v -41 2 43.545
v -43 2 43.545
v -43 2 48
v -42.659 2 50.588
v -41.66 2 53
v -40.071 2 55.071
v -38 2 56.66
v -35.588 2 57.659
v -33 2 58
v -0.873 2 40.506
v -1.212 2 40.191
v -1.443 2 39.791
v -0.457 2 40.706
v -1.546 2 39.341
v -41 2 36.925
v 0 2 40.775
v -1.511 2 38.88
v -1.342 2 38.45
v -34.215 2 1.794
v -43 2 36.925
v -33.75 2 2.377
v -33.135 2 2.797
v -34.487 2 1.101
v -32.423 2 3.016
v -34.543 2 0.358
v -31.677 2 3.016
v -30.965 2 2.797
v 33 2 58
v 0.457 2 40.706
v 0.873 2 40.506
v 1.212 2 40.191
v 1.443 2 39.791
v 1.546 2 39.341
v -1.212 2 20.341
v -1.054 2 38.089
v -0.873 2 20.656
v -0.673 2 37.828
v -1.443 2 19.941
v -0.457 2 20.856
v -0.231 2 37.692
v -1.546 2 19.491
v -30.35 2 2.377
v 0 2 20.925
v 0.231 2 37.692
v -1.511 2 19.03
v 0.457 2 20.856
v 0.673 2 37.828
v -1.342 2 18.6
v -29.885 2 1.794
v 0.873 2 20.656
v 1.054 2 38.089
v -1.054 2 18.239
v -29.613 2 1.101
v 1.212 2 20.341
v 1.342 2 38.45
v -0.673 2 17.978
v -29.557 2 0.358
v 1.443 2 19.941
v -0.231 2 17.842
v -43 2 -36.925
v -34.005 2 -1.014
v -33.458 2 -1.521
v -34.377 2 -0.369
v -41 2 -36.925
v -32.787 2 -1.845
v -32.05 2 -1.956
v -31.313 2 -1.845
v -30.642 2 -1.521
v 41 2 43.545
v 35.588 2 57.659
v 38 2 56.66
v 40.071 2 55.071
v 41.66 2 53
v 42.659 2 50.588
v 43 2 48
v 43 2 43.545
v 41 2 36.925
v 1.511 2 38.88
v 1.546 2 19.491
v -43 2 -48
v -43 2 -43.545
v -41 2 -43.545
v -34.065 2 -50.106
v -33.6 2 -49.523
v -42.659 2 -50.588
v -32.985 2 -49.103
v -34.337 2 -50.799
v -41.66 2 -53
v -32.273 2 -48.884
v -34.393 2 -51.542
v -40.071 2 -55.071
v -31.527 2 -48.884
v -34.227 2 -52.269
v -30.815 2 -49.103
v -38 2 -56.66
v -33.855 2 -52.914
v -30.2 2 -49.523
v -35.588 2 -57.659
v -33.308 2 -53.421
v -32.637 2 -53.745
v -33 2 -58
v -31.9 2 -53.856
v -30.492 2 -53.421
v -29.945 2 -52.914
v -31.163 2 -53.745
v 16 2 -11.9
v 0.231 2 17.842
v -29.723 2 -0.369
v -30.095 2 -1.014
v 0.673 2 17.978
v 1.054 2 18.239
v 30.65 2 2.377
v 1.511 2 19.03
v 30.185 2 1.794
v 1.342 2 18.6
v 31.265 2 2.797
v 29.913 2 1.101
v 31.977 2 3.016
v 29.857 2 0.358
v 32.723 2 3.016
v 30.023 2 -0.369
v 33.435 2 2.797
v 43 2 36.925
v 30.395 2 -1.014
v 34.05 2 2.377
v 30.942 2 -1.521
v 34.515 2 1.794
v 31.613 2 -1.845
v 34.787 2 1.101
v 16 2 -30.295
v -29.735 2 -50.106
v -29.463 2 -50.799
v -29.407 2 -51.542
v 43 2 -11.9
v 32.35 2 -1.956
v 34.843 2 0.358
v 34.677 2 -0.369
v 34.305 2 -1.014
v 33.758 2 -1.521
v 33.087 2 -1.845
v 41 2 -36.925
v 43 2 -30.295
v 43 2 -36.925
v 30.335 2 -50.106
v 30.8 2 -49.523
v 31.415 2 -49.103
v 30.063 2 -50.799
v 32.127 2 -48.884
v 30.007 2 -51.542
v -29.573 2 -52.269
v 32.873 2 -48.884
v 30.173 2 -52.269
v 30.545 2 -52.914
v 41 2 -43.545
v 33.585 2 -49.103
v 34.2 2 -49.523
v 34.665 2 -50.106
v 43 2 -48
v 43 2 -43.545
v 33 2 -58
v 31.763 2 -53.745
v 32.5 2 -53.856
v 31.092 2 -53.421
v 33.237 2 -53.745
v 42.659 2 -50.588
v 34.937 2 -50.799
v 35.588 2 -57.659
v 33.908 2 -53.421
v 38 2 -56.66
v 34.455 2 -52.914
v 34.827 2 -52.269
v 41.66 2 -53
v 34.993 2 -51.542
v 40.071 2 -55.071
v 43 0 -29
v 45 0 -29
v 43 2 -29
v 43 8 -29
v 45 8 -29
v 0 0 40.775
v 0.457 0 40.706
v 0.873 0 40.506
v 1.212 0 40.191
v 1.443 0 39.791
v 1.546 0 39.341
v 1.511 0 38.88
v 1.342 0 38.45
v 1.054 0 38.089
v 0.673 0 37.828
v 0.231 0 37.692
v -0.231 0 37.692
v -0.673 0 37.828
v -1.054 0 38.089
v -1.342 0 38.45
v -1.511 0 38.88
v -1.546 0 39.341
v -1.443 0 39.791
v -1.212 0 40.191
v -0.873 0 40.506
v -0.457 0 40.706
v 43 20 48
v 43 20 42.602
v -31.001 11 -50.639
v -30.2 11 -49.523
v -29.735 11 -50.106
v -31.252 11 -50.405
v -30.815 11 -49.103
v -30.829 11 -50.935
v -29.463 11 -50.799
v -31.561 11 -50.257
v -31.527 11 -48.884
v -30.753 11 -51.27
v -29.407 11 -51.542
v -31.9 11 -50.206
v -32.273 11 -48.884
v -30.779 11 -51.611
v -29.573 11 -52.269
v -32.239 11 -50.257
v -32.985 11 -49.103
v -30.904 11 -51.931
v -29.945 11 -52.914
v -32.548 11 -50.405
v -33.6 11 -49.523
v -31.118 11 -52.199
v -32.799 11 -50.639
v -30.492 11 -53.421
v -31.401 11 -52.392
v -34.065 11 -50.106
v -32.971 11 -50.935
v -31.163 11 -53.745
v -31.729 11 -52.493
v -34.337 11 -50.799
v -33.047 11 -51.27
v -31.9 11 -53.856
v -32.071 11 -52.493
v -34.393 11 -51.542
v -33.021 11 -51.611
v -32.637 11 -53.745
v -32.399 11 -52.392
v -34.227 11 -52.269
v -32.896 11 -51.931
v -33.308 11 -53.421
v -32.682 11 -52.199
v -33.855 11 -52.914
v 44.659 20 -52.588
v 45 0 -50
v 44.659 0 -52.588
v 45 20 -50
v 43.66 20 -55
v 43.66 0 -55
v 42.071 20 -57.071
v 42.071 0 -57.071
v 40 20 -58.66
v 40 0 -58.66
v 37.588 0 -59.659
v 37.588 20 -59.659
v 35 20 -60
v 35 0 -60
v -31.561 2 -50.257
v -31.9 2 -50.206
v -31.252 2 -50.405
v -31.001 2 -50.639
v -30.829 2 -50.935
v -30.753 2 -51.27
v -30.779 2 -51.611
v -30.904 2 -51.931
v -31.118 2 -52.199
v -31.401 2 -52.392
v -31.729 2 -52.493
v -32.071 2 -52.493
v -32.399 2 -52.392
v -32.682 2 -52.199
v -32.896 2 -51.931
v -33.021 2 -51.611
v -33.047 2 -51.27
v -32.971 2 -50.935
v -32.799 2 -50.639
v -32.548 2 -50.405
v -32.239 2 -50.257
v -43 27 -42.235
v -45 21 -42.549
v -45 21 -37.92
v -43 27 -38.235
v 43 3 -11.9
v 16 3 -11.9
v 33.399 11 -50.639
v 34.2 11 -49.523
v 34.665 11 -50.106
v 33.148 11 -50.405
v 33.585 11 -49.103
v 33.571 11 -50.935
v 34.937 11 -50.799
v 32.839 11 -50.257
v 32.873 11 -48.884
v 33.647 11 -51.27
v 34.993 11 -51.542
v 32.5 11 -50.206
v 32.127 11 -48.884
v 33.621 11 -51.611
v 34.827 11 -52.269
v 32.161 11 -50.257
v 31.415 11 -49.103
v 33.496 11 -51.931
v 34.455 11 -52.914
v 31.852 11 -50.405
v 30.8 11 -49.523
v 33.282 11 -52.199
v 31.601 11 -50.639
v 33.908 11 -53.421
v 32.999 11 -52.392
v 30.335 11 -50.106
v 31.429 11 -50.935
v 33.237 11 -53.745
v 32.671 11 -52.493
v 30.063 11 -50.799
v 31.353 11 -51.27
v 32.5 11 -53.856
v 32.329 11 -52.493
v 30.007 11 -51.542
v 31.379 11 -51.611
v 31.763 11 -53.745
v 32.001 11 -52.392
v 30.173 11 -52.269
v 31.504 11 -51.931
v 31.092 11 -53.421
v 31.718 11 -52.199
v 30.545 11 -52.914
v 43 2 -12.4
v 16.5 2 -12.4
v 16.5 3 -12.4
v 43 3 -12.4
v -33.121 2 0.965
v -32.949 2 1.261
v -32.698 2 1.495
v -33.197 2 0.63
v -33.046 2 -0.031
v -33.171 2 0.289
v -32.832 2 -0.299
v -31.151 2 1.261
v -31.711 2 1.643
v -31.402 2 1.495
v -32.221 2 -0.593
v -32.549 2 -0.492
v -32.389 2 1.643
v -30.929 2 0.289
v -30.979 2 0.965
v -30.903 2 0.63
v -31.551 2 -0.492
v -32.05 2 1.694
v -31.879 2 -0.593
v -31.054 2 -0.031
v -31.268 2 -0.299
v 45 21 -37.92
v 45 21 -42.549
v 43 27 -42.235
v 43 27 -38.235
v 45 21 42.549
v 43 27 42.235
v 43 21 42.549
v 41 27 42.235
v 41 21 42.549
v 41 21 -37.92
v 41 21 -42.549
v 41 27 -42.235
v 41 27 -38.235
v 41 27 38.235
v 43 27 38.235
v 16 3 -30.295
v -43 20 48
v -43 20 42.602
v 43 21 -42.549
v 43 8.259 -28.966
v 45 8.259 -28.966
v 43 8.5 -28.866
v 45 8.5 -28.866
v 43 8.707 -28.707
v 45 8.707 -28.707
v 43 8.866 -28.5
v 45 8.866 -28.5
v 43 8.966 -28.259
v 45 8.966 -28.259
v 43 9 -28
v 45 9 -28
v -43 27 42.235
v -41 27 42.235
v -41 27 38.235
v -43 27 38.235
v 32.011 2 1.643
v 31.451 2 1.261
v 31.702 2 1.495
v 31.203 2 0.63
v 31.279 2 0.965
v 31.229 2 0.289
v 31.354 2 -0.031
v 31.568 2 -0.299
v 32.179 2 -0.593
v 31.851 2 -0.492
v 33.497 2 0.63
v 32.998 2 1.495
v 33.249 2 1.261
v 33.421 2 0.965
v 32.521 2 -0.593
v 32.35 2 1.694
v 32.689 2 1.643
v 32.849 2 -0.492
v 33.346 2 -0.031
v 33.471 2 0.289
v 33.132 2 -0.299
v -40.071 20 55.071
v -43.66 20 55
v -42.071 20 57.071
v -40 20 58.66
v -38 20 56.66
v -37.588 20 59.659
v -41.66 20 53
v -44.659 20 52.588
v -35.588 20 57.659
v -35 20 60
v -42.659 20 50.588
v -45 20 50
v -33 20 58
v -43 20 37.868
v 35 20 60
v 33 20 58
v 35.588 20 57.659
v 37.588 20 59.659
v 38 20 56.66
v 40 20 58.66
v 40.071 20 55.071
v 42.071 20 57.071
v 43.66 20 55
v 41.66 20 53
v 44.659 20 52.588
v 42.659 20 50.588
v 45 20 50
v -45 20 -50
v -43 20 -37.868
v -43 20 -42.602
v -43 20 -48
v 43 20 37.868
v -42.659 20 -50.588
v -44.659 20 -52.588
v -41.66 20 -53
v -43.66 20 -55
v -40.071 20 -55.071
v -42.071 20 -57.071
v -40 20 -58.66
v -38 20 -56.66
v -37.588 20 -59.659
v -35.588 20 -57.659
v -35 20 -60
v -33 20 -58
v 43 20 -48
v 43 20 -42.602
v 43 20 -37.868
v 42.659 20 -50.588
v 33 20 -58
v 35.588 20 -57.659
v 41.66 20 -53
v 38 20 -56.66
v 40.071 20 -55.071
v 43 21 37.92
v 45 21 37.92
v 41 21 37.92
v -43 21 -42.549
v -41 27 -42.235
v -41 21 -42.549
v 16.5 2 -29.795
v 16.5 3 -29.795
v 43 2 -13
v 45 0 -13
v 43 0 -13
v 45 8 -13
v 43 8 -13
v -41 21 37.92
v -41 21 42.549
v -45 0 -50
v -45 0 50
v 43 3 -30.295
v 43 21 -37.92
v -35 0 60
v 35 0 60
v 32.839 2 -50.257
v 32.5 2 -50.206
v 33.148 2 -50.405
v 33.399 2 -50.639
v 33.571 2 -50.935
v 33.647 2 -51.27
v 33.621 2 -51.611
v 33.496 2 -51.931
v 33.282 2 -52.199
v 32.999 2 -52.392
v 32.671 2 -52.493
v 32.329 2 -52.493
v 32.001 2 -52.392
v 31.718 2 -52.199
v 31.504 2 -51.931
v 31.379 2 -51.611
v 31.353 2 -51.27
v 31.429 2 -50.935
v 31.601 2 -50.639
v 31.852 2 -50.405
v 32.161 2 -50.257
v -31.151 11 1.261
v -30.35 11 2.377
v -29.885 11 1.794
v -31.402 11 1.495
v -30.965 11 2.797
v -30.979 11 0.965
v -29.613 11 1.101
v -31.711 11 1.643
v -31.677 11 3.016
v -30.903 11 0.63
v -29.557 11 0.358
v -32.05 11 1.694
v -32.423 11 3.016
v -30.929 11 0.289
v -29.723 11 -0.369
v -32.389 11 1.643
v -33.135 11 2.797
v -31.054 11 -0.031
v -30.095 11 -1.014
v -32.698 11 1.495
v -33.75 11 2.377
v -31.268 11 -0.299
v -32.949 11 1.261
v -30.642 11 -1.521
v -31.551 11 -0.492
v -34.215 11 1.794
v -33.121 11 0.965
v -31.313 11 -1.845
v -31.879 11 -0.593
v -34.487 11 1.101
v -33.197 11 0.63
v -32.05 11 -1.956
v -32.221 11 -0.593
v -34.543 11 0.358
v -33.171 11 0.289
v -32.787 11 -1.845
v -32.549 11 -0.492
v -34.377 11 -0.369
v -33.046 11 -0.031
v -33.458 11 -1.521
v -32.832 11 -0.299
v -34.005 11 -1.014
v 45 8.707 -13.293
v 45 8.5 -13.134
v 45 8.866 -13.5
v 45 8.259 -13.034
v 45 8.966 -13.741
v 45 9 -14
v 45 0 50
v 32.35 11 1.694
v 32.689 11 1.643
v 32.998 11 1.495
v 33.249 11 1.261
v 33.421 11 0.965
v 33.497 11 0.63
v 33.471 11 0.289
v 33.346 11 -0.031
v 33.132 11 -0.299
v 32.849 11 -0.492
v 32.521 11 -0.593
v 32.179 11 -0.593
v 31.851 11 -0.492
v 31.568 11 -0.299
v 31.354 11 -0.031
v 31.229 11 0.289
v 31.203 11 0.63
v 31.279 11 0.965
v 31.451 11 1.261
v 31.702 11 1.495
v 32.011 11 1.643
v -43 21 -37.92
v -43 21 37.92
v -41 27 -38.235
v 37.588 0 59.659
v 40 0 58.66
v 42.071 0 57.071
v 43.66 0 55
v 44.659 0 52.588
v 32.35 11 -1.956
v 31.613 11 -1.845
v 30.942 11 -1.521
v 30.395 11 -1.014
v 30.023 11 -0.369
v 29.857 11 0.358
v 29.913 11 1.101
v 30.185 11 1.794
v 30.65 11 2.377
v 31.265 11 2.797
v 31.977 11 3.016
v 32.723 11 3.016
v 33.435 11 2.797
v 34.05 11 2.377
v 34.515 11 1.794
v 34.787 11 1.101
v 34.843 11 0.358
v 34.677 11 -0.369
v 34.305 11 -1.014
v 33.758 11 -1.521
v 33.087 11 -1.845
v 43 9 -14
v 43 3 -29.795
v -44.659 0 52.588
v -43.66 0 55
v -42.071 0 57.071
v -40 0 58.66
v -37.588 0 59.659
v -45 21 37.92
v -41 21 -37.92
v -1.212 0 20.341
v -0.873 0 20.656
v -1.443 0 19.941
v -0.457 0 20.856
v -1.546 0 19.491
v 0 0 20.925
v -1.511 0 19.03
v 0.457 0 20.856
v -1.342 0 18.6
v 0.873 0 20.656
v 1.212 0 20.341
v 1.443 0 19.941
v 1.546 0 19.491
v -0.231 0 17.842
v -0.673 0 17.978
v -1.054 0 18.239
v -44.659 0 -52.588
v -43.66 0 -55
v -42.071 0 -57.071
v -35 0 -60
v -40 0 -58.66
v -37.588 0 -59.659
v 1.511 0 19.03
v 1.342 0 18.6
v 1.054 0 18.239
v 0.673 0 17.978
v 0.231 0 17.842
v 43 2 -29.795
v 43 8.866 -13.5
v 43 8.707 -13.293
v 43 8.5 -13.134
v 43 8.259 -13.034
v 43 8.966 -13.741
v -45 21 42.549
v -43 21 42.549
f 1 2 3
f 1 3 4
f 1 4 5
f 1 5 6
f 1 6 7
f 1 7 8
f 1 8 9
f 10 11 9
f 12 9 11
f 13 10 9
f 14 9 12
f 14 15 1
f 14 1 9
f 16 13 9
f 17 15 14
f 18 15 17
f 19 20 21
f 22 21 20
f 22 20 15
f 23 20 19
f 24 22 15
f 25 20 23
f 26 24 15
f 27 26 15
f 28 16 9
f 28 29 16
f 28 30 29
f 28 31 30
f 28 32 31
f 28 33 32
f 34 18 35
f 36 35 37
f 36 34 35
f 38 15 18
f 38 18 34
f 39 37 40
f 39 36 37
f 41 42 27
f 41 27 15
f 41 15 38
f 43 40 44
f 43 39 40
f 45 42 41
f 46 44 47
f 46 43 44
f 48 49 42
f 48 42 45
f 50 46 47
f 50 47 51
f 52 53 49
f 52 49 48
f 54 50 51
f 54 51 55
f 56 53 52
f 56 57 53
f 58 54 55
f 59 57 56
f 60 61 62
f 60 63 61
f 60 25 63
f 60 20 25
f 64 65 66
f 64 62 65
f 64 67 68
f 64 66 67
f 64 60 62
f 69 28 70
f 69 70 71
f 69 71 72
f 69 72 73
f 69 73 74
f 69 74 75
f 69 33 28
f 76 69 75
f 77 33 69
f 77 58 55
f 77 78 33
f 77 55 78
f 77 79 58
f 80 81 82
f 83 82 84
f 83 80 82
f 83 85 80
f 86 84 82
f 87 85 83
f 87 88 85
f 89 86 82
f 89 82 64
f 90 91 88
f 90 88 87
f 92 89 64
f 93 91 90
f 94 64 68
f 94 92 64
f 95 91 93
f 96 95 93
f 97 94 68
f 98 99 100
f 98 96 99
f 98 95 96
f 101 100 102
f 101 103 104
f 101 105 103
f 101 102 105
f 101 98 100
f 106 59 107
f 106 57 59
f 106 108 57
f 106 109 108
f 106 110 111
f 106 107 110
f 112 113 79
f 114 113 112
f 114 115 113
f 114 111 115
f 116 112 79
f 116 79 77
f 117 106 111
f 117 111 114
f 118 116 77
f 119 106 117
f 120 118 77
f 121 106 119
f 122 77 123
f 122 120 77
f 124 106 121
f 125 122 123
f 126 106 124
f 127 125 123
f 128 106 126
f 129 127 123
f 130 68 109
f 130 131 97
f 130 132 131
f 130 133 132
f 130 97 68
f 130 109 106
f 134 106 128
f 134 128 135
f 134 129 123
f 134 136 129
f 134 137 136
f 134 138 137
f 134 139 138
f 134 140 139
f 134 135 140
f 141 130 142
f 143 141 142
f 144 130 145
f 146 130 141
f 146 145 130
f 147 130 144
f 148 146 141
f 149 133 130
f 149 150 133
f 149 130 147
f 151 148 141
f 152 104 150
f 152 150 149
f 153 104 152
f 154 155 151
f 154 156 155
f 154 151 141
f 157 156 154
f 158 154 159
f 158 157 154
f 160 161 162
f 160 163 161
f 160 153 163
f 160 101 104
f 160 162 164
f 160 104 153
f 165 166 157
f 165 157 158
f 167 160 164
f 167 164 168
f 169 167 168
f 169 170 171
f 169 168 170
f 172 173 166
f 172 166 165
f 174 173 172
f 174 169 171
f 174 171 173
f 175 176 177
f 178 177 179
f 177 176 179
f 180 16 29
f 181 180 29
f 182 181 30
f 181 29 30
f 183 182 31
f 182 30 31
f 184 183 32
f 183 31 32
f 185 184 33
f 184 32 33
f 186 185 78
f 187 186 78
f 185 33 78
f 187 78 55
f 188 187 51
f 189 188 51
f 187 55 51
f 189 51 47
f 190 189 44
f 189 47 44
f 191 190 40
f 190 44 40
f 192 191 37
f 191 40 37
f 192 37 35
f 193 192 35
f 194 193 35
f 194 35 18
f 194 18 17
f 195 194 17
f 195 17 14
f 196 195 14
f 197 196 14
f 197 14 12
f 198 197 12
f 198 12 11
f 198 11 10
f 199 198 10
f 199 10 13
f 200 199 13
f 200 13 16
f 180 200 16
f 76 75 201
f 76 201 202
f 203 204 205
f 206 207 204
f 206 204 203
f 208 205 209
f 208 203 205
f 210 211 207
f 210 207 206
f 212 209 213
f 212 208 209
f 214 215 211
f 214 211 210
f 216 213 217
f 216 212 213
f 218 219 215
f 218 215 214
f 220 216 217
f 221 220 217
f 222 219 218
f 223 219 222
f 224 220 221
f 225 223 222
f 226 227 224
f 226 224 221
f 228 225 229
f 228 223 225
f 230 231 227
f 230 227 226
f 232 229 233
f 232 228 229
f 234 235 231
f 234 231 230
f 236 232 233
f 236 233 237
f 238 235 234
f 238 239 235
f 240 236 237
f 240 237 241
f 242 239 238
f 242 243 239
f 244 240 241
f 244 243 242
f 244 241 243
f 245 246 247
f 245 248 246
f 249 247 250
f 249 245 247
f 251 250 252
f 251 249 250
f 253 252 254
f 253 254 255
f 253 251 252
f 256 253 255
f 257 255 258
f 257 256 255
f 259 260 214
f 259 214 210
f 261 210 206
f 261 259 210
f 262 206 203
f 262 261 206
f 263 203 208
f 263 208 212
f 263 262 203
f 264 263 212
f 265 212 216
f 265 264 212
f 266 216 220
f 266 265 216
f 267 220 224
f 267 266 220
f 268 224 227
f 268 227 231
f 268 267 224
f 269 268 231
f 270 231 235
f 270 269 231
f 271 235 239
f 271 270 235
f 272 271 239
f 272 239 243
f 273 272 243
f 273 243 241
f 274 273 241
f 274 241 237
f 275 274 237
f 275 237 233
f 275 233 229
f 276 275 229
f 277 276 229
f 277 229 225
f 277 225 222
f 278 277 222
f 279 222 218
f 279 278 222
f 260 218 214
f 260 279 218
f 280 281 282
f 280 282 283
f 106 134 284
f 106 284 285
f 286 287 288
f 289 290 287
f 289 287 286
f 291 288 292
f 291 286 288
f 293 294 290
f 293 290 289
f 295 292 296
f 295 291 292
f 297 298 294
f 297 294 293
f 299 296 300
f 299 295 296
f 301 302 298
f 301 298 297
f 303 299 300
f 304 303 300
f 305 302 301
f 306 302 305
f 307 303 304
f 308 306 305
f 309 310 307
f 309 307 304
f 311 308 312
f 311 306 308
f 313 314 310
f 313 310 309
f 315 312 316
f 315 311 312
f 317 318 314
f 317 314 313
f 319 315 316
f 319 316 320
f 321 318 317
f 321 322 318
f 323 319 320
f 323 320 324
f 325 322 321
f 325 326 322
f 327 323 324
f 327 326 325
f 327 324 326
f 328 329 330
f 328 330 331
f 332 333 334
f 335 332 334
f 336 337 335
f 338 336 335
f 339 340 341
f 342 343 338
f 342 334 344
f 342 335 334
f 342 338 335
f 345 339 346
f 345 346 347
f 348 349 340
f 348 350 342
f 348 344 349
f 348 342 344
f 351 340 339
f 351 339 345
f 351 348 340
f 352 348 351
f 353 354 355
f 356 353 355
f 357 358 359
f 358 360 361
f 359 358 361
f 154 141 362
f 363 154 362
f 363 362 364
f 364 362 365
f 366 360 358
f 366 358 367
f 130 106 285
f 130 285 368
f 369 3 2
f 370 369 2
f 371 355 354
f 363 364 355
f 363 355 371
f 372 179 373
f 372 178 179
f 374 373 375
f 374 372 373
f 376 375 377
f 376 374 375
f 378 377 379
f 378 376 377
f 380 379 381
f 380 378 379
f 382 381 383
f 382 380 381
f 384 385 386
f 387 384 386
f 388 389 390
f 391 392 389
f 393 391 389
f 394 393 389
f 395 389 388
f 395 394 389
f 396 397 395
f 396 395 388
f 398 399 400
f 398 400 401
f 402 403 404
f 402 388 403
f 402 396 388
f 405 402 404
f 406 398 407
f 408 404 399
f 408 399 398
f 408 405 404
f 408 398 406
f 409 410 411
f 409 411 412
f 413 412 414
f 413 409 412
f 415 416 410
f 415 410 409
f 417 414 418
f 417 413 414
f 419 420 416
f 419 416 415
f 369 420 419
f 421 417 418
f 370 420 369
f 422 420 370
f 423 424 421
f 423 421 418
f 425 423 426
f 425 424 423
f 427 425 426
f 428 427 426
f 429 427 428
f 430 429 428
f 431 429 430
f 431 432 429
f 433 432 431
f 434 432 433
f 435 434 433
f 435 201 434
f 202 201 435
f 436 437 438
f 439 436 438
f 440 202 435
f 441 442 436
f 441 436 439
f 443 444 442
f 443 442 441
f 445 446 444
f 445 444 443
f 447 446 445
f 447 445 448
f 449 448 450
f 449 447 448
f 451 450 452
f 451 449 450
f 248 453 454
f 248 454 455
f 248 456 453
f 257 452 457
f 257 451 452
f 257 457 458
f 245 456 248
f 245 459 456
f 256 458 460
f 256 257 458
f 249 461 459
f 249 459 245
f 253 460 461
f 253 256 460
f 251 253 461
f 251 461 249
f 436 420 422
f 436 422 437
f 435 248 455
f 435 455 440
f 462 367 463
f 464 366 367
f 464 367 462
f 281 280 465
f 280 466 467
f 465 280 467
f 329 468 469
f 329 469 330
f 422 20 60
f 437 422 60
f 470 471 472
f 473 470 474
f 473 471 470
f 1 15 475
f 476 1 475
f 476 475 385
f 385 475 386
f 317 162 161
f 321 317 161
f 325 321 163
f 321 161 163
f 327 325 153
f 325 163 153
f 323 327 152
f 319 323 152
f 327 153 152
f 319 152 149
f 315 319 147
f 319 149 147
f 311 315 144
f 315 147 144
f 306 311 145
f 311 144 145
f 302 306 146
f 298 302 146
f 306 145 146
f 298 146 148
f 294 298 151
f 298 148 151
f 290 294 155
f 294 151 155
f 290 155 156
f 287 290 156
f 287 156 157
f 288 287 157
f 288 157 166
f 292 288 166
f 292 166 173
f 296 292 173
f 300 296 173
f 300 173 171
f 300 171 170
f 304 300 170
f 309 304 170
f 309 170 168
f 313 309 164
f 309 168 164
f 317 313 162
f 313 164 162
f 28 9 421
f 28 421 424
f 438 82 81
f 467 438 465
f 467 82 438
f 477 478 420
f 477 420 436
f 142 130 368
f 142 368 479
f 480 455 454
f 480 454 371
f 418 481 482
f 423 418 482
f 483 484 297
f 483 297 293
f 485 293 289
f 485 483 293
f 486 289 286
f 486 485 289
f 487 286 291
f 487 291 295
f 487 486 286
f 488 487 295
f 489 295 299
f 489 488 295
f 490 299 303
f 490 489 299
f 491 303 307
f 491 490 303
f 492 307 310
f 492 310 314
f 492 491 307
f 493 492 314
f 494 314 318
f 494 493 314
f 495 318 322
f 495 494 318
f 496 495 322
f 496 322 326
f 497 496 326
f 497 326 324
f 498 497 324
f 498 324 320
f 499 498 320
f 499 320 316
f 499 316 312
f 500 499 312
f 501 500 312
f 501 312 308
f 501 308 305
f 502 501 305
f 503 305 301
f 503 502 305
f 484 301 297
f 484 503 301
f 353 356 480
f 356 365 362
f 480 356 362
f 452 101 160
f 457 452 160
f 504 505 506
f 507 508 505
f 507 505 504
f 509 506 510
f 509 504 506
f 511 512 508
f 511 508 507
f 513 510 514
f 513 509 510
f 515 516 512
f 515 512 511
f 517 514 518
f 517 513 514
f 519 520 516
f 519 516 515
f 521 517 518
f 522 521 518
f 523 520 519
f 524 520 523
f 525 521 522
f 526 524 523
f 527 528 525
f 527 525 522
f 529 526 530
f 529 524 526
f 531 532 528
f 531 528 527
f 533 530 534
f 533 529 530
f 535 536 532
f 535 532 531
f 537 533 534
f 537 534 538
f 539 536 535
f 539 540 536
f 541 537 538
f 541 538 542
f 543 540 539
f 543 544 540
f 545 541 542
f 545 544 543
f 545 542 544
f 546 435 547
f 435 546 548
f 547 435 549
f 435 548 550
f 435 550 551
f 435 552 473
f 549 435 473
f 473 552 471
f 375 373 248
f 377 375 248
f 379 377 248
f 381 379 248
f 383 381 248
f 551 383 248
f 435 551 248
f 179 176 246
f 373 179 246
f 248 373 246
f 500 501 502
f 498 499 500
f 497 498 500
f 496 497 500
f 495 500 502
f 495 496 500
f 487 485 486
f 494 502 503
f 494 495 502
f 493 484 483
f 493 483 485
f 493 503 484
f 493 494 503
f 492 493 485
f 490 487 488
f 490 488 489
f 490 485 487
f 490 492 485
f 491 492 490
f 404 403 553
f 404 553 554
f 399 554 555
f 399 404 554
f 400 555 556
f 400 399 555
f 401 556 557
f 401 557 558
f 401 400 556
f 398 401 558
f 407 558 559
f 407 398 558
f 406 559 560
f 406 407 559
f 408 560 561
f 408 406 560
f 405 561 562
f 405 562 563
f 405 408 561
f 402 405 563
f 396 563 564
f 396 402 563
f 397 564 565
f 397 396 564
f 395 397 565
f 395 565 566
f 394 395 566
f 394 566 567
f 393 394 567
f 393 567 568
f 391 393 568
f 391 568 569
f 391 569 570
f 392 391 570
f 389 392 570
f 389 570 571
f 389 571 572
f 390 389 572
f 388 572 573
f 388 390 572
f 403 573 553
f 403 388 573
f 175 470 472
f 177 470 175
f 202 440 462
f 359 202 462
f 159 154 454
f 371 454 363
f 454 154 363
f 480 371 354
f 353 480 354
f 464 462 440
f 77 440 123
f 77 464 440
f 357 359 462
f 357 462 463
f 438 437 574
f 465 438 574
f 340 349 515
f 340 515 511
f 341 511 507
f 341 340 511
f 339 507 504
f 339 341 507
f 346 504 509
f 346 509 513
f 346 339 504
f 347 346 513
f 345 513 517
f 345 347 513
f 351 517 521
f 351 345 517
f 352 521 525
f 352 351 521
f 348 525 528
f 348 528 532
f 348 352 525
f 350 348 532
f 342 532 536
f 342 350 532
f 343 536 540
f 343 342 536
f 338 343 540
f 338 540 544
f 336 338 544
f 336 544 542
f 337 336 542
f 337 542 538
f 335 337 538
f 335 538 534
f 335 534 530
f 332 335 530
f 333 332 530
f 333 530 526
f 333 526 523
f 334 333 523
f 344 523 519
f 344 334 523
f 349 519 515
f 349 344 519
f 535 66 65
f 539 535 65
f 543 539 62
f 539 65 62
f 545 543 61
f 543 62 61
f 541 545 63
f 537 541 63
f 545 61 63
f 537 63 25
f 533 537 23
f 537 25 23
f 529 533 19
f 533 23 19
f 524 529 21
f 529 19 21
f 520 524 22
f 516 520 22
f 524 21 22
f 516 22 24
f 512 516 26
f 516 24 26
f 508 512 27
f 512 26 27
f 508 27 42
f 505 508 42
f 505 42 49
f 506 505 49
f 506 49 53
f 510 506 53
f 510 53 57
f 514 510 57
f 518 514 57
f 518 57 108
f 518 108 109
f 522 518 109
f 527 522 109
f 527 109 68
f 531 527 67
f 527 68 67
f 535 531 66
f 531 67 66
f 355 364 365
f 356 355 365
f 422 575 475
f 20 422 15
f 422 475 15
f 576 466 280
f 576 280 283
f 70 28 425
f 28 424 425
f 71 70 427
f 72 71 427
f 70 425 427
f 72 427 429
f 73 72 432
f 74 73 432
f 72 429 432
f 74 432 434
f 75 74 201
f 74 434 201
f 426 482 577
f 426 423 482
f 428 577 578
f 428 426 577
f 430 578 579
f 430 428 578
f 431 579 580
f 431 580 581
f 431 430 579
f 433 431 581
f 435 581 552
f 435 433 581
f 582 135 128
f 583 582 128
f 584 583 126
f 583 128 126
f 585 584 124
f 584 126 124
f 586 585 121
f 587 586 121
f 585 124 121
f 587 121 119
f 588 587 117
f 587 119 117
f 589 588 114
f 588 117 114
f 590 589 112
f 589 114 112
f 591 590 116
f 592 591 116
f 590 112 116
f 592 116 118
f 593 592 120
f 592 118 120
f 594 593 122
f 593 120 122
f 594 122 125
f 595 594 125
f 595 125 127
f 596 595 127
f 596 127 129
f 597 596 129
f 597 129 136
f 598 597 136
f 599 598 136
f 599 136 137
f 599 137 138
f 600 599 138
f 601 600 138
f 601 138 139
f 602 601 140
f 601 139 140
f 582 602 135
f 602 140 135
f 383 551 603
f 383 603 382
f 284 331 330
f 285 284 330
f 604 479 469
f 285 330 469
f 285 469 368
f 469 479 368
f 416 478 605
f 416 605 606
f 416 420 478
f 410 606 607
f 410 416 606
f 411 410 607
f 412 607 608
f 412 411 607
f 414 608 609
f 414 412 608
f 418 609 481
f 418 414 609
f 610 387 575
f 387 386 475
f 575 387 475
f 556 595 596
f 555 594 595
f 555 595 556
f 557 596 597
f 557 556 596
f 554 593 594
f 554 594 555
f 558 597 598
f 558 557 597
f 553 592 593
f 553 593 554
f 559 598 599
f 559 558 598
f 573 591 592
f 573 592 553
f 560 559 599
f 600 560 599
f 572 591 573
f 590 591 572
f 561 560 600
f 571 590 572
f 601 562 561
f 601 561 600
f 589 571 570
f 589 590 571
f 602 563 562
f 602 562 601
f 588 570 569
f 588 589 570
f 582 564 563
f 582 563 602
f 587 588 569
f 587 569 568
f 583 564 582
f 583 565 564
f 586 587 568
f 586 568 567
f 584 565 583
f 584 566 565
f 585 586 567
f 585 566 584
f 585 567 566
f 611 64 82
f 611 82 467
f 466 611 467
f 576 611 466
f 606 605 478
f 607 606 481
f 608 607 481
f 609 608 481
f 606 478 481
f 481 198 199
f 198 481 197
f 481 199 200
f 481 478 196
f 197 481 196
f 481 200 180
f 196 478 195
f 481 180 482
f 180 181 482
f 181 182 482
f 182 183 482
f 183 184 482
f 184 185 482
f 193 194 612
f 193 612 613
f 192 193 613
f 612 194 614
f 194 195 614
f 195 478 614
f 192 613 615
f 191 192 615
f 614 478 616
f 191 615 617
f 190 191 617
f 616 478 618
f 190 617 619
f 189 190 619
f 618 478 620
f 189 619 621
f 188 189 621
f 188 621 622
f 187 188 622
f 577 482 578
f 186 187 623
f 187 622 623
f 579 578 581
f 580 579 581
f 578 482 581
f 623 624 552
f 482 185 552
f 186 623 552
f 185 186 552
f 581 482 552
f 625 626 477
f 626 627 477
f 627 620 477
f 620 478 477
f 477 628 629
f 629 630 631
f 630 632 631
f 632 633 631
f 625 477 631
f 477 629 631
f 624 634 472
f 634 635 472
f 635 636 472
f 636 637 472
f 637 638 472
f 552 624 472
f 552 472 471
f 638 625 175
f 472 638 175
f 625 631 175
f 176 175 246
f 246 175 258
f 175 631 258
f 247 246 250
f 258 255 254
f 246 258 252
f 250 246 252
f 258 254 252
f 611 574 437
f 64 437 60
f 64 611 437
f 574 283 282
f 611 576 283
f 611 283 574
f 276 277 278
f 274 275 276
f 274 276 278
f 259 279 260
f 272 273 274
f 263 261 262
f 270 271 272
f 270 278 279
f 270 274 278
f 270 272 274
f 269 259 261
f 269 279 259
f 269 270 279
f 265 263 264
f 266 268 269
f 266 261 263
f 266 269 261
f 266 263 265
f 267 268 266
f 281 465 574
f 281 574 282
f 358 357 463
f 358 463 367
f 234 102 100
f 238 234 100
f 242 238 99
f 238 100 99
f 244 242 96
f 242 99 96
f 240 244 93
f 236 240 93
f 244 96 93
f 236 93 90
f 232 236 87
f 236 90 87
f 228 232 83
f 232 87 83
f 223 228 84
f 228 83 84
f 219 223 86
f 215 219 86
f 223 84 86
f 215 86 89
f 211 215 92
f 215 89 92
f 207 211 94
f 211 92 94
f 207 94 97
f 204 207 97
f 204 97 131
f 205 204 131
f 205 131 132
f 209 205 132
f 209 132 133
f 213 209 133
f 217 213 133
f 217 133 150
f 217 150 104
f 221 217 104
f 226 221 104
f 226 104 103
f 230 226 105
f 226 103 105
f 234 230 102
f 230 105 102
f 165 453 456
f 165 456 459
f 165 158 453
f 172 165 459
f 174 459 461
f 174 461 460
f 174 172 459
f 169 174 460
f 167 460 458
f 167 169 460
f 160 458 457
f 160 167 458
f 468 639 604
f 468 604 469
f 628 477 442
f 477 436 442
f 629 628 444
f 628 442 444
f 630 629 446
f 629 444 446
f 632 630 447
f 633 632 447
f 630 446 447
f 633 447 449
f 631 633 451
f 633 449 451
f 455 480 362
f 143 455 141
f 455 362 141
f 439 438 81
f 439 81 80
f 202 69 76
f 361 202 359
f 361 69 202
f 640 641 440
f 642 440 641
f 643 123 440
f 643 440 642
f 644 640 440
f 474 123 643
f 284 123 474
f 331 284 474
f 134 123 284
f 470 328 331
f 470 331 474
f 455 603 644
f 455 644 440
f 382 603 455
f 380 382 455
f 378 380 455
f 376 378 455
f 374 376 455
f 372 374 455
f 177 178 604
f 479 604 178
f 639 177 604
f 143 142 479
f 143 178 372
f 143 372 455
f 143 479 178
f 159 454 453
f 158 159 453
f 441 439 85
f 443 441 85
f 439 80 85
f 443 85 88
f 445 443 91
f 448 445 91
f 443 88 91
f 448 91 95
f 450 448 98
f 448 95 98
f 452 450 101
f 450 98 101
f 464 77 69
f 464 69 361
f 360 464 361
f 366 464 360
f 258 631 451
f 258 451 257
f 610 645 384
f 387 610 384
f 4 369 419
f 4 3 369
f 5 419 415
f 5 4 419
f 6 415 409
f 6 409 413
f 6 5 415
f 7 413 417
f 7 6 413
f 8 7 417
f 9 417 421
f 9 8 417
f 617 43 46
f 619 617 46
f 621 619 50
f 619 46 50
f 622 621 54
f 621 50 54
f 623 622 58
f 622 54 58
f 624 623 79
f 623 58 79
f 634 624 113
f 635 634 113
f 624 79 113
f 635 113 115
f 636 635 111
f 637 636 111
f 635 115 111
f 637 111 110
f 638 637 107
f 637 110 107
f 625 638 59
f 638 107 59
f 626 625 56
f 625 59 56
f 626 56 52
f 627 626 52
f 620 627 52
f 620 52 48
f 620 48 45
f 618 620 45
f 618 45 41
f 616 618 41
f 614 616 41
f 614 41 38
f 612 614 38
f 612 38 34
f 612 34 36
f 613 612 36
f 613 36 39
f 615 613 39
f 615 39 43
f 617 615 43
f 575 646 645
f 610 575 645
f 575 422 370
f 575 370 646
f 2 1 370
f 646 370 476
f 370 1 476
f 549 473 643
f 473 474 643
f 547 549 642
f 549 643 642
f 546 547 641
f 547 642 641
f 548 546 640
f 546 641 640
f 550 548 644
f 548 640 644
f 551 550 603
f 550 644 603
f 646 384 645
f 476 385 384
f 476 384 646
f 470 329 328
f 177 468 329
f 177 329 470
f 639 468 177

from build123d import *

# Parameters (mm, degrees)
CROQUIS2_W                   = 90
CROQUIS2_H                   = 120
SALIENTE_EXTRUIR1_DEPTH      = 20
VACIADO1_T                   = -2
REDONDEO1_R                  = 10
CROQUIS3_R                   = 1.55
CORTAR_EXTRUIR1_DEPTH        = 20
CROQUIS4_R                   = 2.5
CROQUIS4_R_2                 = 1.15
SALIENTE_EXTRUIR2_DEPTH      = 9
CROQUIS5_W                   = 16
CROQUIS5_H                   = 9
CORTAR_EXTRUIR2_DEPTH        = 2
REDONDEO2_R                  = 1
SALIENTE_EXTRUIR3_DEPTH      = 1
GANCHO_START                 = 41
GANCHO_DE_MOSQUET_N1_DEPTH   = 2
GANCHO_START_2               = -42.549292451
GANCHO_DE_MOSQUET_N1_2_DEPTH = 4.628893351
GANCHO_START_3               = 43
GANCHO_DE_MOSQUET_N1_3_DEPTH = 3
GANCHO_DE_MOSQUET_N1_4_DEPTH = 2
SIMETR_A2_START              = 41
SIMETR_A2_COPY_1_DEPTH       = 2
SIMETR_A2_START_2            = -42.549292451
SIMETR_A2_COPY_2_DEPTH       = 4.628893351
SIMETR_A2_START_3            = 43
SIMETR_A2_COPY_3_DEPTH       = 3
SIMETR_A2_COPY_4_DEPTH       = 2


with BuildPart() as part:
    # Croquis2 → Saliente-Extruir1 (new body)
    with BuildSketch(Plane(origin=(0, 0, 0), x_dir=(1, 0, 0), z_dir=(0, 1, 0))):
        Rectangle(CROQUIS2_W, CROQUIS2_H)
    extrude(amount=SALIENTE_EXTRUIR1_DEPTH)

    # Vaciado1
    vaciado1_openings = [part.faces().sort_by_distance(p)[0] for p in [
        (0, 20, 0),
    ]]
    offset(amount=VACIADO1_T, openings=vaciado1_openings, kind=Kind.INTERSECTION)

    # Redondeo1
    redondeo1_edges = [part.edges().sort_by_distance(p)[0] for p in [
        (-43, 11, -58),
        (-43, 11, 58),
        (43, 11, 58),
        (43, 11, -58),
        (-45, 10, -60),
        (45, 10, -60),
        (45, 10, 60),
        (-45, 10, 60),
    ]]
    fillet(redondeo1_edges, radius=REDONDEO1_R)

    # Croquis3 → Cortar-Extruir1 (cut)
    with BuildSketch(Plane(origin=(0, 2, 0), x_dir=(1, 0, 0), z_dir=(0, 1, 0))):
        with Locations(Location((0, -39.225, 0), (0, 0, 270))):
            Circle(CROQUIS3_R)
        with Locations(Location((0, -19.375, 0), (0, 0, 270))):
            Circle(CROQUIS3_R)
    extrude(amount=-CORTAR_EXTRUIR1_DEPTH, mode=Mode.SUBTRACT)

    # Croquis4 → Saliente-Extruir2 (add)
    # profile 1 of 4: a face of its own
    with BuildSketch(Plane(origin=(0, 2, 0), x_dir=(1, 0, 0), z_dir=(0, 1, 0))):
        with Locations(Location((-31.9, 51.355578, 0), (0, 0, 90))):
            Circle(CROQUIS4_R)
        with Locations(Location((-31.9, 51.355578, 0), (0, 0, 270))):
            Circle(CROQUIS4_R_2, mode=Mode.SUBTRACT)
    # profile 2 of 4: a face of its own
    with BuildSketch(Plane(origin=(0, 2, 0), x_dir=(1, 0, 0), z_dir=(0, 1, 0))):
        with Locations(Location((32.5, 51.355578, 0), (0, 0, 90))):
            Circle(CROQUIS4_R)
        with Locations(Location((32.5, 51.355578, 0), (0, 0, 270))):
            Circle(CROQUIS4_R_2, mode=Mode.SUBTRACT)
    # profile 3 of 4: a face of its own
    with BuildSketch(Plane(origin=(0, 2, 0), x_dir=(1, 0, 0), z_dir=(0, 1, 0))):
        with Locations(Location((32.35, -0.544422, 0), (0, 0, 90))):
            Circle(CROQUIS4_R)
        with Locations(Location((32.35, -0.544422, 0), (0, 0, 270))):
            Circle(CROQUIS4_R_2, mode=Mode.SUBTRACT)
    # profile 4 of 4: a face of its own
    with BuildSketch(Plane(origin=(0, 2, 0), x_dir=(1, 0, 0), z_dir=(0, 1, 0))):
        with Locations(Location((-32.05, -0.544422, 0), (0, 0, 90))):
            Circle(CROQUIS4_R)
        with Locations(Location((-32.05, -0.544422, 0), (0, 0, 270))):
            Circle(CROQUIS4_R_2, mode=Mode.SUBTRACT)
    extrude(amount=SALIENTE_EXTRUIR2_DEPTH)

    # Croquis5 → Cortar-Extruir2 (cut)
    with BuildSketch(Plane(origin=(45, 0, 0), x_dir=(0, 0, -1), z_dir=(1, 0, 0))):
        with Locations((21, 4.5)):
            Rectangle(CROQUIS5_W, CROQUIS5_H)
    extrude(amount=-CORTAR_EXTRUIR2_DEPTH, mode=Mode.SUBTRACT)

    # Redondeo2
    redondeo2_edges = [part.edges().sort_by_distance(p)[0] for p in [
        (44, 9, -13),
        (44, 9, -29),
    ]]
    fillet(redondeo2_edges, radius=REDONDEO2_R)

    # Croquis6 → Saliente-Extruir3 (add)
    with BuildSketch(Plane(origin=(0, 2, 0), x_dir=(1, 0, 0), z_dir=(0, 1, 0))):
        Polygon((43, 29.794557256), (16.5, 29.794557256), (16.5, 12.4), (43, 12.4), (43, 11.9), (16, 11.9), (16, 30.294557256), (43, 30.294557256), align=None)
    extrude(amount=SALIENTE_EXTRUIR3_DEPTH)



with BuildPart() as body_2:
    # Gancho de mosquetón1: read off the stored shape, not the designer's step
    # Gancho de mosquetón1 outline → Gancho de mosquetón1 (new body)
    with BuildSketch(Plane.YZ.offset(GANCHO_START)):
        Polygon((21, -37.9203991), (21, -42.549292451), (27, -42.234845775), (27, -38.234845775), align=None)
    gancho_de_mosquet_n1 = extrude(amount=GANCHO_DE_MOSQUET_N1_DEPTH)

    # Gancho de mosquet_n1 2 outline → Gancho de mosquet_n1 2 (add)
    with BuildSketch(Plane.XY.offset(GANCHO_START_2)):
        Polygon((43, 21), (45, 21), (43, 27), align=None)
    gancho_de_mosquet_n1_2 = extrude(amount=GANCHO_DE_MOSQUET_N1_2_DEPTH)

    # Gancho de mosquet_n1 3 outline → Gancho de mosquet_n1 3 (cut)
    with BuildSketch(Plane.YZ.offset(GANCHO_START_3)):
        Polygon((27, -42.234845775), (21, -42.549292451), (28, -42.549292451), (28, -42.182437996), align=None)
        Polygon((28, -37.9203991), (21, -37.9203991), (27, -38.234845775), (28, -38.287253554), align=None)
    gancho_de_mosquet_n1_3 = extrude(amount=GANCHO_DE_MOSQUET_N1_3_DEPTH, mode=Mode.SUBTRACT)


with BuildPart() as part_1:
    add(part.part)

    add(body_2.part)  # Gancho de mosquet_n1 4 merges body 2
    # Gancho de mosquet_n1 4 outline → Gancho de mosquet_n1 4 (add)
    with BuildSketch(Plane.YZ.offset(GANCHO_START)):
        Polygon((1, -43.597448037), (2, -43.545040258), (21, -42.549292451), (21, -37.9203991), (2, -36.924651293), (1, -36.872243514), align=None)
    gancho_de_mosquet_n1_4 = extrude(amount=GANCHO_DE_MOSQUET_N1_4_DEPTH)

    # Simetría1: Gancho de mosquetón1, Gancho de mosquet_n1 2, Gancho de mosquet_n1 3, Gancho de mosquet_n1 4 across plane
    add(gancho_de_mosquet_n1.mirror(Plane.XY))
    add(gancho_de_mosquet_n1_2.mirror(Plane.XY))
    add(gancho_de_mosquet_n1_3.mirror(Plane.XY), mode=Mode.SUBTRACT)
    add(gancho_de_mosquet_n1_4.mirror(Plane.XY))

    # Simetría2: Gancho de mosquetón1, Gancho de mosquet_n1 2, Gancho de mosquet_n1 3, Gancho de mosquet_n1 4 across plane
    add(gancho_de_mosquet_n1.mirror(Plane(origin=(0, 0, 0), x_dir=(0, 0, 1), z_dir=(1, 0, 0))))
    add(gancho_de_mosquet_n1_2.mirror(Plane(origin=(0, 0, 0), x_dir=(0, 0, 1), z_dir=(1, 0, 0))))
    add(gancho_de_mosquet_n1_3.mirror(Plane(origin=(0, 0, 0), x_dir=(0, 0, 1), z_dir=(1, 0, 0))), mode=Mode.SUBTRACT)
    add(gancho_de_mosquet_n1_4.mirror(Plane(origin=(0, 0, 0), x_dir=(0, 0, 1), z_dir=(1, 0, 0))))



with BuildPart() as body_2_2:
    # Simetría2 copy 1 sketch → Simetría2 copy 1 (new body)
    with BuildSketch(Plane(origin=(0, 0, 0), x_dir=(0, 1, 0), z_dir=(-1, 0, 0)).offset(SIMETR_A2_START)):
        Polygon((21, -37.9203991), (21, -42.549292451), (27, -42.234845775), (27, -38.234845775), align=None)
    extrude(amount=SIMETR_A2_COPY_1_DEPTH)

    # Simetría2 copy 2 sketch → Simetría2 copy 2 (add)
    with BuildSketch(Plane(origin=(0, 0, 0), x_dir=(-1, 0, 0), z_dir=(0, 0, -1)).offset(SIMETR_A2_START_2)):
        Polygon((43, 21), (45, 21), (43, 27), align=None)
    extrude(amount=SIMETR_A2_COPY_2_DEPTH)

    # Simetría2 copy 3 sketch → Simetría2 copy 3 (cut)
    with BuildSketch(Plane(origin=(0, 0, 0), x_dir=(0, 1, 0), z_dir=(-1, 0, 0)).offset(SIMETR_A2_START_3)):
        Polygon((27, -42.234845775), (21, -42.549292451), (28, -42.549292451), (28, -42.182437996), align=None)
        Polygon((28, -37.9203991), (21, -37.9203991), (27, -38.234845775), (28, -38.287253554), align=None)
    extrude(amount=SIMETR_A2_COPY_3_DEPTH, mode=Mode.SUBTRACT)


with BuildPart() as part_2:
    add(part_1.part)

    add(body_2_2.part)  # Simetría2 copy 4 merges body 2 2
    # Simetría2 copy 4 sketch → Simetría2 copy 4 (add)
    with BuildSketch(Plane(origin=(0, 0, 0), x_dir=(0, 1, 0), z_dir=(-1, 0, 0)).offset(SIMETR_A2_START)):
        Polygon((1, -43.597448037), (2, -43.545040258), (21, -42.549292451), (21, -37.9203991), (2, -36.924651293), (1, -36.872243514), align=None)
    extrude(amount=SIMETR_A2_COPY_4_DEPTH)


solid = part_2.part
